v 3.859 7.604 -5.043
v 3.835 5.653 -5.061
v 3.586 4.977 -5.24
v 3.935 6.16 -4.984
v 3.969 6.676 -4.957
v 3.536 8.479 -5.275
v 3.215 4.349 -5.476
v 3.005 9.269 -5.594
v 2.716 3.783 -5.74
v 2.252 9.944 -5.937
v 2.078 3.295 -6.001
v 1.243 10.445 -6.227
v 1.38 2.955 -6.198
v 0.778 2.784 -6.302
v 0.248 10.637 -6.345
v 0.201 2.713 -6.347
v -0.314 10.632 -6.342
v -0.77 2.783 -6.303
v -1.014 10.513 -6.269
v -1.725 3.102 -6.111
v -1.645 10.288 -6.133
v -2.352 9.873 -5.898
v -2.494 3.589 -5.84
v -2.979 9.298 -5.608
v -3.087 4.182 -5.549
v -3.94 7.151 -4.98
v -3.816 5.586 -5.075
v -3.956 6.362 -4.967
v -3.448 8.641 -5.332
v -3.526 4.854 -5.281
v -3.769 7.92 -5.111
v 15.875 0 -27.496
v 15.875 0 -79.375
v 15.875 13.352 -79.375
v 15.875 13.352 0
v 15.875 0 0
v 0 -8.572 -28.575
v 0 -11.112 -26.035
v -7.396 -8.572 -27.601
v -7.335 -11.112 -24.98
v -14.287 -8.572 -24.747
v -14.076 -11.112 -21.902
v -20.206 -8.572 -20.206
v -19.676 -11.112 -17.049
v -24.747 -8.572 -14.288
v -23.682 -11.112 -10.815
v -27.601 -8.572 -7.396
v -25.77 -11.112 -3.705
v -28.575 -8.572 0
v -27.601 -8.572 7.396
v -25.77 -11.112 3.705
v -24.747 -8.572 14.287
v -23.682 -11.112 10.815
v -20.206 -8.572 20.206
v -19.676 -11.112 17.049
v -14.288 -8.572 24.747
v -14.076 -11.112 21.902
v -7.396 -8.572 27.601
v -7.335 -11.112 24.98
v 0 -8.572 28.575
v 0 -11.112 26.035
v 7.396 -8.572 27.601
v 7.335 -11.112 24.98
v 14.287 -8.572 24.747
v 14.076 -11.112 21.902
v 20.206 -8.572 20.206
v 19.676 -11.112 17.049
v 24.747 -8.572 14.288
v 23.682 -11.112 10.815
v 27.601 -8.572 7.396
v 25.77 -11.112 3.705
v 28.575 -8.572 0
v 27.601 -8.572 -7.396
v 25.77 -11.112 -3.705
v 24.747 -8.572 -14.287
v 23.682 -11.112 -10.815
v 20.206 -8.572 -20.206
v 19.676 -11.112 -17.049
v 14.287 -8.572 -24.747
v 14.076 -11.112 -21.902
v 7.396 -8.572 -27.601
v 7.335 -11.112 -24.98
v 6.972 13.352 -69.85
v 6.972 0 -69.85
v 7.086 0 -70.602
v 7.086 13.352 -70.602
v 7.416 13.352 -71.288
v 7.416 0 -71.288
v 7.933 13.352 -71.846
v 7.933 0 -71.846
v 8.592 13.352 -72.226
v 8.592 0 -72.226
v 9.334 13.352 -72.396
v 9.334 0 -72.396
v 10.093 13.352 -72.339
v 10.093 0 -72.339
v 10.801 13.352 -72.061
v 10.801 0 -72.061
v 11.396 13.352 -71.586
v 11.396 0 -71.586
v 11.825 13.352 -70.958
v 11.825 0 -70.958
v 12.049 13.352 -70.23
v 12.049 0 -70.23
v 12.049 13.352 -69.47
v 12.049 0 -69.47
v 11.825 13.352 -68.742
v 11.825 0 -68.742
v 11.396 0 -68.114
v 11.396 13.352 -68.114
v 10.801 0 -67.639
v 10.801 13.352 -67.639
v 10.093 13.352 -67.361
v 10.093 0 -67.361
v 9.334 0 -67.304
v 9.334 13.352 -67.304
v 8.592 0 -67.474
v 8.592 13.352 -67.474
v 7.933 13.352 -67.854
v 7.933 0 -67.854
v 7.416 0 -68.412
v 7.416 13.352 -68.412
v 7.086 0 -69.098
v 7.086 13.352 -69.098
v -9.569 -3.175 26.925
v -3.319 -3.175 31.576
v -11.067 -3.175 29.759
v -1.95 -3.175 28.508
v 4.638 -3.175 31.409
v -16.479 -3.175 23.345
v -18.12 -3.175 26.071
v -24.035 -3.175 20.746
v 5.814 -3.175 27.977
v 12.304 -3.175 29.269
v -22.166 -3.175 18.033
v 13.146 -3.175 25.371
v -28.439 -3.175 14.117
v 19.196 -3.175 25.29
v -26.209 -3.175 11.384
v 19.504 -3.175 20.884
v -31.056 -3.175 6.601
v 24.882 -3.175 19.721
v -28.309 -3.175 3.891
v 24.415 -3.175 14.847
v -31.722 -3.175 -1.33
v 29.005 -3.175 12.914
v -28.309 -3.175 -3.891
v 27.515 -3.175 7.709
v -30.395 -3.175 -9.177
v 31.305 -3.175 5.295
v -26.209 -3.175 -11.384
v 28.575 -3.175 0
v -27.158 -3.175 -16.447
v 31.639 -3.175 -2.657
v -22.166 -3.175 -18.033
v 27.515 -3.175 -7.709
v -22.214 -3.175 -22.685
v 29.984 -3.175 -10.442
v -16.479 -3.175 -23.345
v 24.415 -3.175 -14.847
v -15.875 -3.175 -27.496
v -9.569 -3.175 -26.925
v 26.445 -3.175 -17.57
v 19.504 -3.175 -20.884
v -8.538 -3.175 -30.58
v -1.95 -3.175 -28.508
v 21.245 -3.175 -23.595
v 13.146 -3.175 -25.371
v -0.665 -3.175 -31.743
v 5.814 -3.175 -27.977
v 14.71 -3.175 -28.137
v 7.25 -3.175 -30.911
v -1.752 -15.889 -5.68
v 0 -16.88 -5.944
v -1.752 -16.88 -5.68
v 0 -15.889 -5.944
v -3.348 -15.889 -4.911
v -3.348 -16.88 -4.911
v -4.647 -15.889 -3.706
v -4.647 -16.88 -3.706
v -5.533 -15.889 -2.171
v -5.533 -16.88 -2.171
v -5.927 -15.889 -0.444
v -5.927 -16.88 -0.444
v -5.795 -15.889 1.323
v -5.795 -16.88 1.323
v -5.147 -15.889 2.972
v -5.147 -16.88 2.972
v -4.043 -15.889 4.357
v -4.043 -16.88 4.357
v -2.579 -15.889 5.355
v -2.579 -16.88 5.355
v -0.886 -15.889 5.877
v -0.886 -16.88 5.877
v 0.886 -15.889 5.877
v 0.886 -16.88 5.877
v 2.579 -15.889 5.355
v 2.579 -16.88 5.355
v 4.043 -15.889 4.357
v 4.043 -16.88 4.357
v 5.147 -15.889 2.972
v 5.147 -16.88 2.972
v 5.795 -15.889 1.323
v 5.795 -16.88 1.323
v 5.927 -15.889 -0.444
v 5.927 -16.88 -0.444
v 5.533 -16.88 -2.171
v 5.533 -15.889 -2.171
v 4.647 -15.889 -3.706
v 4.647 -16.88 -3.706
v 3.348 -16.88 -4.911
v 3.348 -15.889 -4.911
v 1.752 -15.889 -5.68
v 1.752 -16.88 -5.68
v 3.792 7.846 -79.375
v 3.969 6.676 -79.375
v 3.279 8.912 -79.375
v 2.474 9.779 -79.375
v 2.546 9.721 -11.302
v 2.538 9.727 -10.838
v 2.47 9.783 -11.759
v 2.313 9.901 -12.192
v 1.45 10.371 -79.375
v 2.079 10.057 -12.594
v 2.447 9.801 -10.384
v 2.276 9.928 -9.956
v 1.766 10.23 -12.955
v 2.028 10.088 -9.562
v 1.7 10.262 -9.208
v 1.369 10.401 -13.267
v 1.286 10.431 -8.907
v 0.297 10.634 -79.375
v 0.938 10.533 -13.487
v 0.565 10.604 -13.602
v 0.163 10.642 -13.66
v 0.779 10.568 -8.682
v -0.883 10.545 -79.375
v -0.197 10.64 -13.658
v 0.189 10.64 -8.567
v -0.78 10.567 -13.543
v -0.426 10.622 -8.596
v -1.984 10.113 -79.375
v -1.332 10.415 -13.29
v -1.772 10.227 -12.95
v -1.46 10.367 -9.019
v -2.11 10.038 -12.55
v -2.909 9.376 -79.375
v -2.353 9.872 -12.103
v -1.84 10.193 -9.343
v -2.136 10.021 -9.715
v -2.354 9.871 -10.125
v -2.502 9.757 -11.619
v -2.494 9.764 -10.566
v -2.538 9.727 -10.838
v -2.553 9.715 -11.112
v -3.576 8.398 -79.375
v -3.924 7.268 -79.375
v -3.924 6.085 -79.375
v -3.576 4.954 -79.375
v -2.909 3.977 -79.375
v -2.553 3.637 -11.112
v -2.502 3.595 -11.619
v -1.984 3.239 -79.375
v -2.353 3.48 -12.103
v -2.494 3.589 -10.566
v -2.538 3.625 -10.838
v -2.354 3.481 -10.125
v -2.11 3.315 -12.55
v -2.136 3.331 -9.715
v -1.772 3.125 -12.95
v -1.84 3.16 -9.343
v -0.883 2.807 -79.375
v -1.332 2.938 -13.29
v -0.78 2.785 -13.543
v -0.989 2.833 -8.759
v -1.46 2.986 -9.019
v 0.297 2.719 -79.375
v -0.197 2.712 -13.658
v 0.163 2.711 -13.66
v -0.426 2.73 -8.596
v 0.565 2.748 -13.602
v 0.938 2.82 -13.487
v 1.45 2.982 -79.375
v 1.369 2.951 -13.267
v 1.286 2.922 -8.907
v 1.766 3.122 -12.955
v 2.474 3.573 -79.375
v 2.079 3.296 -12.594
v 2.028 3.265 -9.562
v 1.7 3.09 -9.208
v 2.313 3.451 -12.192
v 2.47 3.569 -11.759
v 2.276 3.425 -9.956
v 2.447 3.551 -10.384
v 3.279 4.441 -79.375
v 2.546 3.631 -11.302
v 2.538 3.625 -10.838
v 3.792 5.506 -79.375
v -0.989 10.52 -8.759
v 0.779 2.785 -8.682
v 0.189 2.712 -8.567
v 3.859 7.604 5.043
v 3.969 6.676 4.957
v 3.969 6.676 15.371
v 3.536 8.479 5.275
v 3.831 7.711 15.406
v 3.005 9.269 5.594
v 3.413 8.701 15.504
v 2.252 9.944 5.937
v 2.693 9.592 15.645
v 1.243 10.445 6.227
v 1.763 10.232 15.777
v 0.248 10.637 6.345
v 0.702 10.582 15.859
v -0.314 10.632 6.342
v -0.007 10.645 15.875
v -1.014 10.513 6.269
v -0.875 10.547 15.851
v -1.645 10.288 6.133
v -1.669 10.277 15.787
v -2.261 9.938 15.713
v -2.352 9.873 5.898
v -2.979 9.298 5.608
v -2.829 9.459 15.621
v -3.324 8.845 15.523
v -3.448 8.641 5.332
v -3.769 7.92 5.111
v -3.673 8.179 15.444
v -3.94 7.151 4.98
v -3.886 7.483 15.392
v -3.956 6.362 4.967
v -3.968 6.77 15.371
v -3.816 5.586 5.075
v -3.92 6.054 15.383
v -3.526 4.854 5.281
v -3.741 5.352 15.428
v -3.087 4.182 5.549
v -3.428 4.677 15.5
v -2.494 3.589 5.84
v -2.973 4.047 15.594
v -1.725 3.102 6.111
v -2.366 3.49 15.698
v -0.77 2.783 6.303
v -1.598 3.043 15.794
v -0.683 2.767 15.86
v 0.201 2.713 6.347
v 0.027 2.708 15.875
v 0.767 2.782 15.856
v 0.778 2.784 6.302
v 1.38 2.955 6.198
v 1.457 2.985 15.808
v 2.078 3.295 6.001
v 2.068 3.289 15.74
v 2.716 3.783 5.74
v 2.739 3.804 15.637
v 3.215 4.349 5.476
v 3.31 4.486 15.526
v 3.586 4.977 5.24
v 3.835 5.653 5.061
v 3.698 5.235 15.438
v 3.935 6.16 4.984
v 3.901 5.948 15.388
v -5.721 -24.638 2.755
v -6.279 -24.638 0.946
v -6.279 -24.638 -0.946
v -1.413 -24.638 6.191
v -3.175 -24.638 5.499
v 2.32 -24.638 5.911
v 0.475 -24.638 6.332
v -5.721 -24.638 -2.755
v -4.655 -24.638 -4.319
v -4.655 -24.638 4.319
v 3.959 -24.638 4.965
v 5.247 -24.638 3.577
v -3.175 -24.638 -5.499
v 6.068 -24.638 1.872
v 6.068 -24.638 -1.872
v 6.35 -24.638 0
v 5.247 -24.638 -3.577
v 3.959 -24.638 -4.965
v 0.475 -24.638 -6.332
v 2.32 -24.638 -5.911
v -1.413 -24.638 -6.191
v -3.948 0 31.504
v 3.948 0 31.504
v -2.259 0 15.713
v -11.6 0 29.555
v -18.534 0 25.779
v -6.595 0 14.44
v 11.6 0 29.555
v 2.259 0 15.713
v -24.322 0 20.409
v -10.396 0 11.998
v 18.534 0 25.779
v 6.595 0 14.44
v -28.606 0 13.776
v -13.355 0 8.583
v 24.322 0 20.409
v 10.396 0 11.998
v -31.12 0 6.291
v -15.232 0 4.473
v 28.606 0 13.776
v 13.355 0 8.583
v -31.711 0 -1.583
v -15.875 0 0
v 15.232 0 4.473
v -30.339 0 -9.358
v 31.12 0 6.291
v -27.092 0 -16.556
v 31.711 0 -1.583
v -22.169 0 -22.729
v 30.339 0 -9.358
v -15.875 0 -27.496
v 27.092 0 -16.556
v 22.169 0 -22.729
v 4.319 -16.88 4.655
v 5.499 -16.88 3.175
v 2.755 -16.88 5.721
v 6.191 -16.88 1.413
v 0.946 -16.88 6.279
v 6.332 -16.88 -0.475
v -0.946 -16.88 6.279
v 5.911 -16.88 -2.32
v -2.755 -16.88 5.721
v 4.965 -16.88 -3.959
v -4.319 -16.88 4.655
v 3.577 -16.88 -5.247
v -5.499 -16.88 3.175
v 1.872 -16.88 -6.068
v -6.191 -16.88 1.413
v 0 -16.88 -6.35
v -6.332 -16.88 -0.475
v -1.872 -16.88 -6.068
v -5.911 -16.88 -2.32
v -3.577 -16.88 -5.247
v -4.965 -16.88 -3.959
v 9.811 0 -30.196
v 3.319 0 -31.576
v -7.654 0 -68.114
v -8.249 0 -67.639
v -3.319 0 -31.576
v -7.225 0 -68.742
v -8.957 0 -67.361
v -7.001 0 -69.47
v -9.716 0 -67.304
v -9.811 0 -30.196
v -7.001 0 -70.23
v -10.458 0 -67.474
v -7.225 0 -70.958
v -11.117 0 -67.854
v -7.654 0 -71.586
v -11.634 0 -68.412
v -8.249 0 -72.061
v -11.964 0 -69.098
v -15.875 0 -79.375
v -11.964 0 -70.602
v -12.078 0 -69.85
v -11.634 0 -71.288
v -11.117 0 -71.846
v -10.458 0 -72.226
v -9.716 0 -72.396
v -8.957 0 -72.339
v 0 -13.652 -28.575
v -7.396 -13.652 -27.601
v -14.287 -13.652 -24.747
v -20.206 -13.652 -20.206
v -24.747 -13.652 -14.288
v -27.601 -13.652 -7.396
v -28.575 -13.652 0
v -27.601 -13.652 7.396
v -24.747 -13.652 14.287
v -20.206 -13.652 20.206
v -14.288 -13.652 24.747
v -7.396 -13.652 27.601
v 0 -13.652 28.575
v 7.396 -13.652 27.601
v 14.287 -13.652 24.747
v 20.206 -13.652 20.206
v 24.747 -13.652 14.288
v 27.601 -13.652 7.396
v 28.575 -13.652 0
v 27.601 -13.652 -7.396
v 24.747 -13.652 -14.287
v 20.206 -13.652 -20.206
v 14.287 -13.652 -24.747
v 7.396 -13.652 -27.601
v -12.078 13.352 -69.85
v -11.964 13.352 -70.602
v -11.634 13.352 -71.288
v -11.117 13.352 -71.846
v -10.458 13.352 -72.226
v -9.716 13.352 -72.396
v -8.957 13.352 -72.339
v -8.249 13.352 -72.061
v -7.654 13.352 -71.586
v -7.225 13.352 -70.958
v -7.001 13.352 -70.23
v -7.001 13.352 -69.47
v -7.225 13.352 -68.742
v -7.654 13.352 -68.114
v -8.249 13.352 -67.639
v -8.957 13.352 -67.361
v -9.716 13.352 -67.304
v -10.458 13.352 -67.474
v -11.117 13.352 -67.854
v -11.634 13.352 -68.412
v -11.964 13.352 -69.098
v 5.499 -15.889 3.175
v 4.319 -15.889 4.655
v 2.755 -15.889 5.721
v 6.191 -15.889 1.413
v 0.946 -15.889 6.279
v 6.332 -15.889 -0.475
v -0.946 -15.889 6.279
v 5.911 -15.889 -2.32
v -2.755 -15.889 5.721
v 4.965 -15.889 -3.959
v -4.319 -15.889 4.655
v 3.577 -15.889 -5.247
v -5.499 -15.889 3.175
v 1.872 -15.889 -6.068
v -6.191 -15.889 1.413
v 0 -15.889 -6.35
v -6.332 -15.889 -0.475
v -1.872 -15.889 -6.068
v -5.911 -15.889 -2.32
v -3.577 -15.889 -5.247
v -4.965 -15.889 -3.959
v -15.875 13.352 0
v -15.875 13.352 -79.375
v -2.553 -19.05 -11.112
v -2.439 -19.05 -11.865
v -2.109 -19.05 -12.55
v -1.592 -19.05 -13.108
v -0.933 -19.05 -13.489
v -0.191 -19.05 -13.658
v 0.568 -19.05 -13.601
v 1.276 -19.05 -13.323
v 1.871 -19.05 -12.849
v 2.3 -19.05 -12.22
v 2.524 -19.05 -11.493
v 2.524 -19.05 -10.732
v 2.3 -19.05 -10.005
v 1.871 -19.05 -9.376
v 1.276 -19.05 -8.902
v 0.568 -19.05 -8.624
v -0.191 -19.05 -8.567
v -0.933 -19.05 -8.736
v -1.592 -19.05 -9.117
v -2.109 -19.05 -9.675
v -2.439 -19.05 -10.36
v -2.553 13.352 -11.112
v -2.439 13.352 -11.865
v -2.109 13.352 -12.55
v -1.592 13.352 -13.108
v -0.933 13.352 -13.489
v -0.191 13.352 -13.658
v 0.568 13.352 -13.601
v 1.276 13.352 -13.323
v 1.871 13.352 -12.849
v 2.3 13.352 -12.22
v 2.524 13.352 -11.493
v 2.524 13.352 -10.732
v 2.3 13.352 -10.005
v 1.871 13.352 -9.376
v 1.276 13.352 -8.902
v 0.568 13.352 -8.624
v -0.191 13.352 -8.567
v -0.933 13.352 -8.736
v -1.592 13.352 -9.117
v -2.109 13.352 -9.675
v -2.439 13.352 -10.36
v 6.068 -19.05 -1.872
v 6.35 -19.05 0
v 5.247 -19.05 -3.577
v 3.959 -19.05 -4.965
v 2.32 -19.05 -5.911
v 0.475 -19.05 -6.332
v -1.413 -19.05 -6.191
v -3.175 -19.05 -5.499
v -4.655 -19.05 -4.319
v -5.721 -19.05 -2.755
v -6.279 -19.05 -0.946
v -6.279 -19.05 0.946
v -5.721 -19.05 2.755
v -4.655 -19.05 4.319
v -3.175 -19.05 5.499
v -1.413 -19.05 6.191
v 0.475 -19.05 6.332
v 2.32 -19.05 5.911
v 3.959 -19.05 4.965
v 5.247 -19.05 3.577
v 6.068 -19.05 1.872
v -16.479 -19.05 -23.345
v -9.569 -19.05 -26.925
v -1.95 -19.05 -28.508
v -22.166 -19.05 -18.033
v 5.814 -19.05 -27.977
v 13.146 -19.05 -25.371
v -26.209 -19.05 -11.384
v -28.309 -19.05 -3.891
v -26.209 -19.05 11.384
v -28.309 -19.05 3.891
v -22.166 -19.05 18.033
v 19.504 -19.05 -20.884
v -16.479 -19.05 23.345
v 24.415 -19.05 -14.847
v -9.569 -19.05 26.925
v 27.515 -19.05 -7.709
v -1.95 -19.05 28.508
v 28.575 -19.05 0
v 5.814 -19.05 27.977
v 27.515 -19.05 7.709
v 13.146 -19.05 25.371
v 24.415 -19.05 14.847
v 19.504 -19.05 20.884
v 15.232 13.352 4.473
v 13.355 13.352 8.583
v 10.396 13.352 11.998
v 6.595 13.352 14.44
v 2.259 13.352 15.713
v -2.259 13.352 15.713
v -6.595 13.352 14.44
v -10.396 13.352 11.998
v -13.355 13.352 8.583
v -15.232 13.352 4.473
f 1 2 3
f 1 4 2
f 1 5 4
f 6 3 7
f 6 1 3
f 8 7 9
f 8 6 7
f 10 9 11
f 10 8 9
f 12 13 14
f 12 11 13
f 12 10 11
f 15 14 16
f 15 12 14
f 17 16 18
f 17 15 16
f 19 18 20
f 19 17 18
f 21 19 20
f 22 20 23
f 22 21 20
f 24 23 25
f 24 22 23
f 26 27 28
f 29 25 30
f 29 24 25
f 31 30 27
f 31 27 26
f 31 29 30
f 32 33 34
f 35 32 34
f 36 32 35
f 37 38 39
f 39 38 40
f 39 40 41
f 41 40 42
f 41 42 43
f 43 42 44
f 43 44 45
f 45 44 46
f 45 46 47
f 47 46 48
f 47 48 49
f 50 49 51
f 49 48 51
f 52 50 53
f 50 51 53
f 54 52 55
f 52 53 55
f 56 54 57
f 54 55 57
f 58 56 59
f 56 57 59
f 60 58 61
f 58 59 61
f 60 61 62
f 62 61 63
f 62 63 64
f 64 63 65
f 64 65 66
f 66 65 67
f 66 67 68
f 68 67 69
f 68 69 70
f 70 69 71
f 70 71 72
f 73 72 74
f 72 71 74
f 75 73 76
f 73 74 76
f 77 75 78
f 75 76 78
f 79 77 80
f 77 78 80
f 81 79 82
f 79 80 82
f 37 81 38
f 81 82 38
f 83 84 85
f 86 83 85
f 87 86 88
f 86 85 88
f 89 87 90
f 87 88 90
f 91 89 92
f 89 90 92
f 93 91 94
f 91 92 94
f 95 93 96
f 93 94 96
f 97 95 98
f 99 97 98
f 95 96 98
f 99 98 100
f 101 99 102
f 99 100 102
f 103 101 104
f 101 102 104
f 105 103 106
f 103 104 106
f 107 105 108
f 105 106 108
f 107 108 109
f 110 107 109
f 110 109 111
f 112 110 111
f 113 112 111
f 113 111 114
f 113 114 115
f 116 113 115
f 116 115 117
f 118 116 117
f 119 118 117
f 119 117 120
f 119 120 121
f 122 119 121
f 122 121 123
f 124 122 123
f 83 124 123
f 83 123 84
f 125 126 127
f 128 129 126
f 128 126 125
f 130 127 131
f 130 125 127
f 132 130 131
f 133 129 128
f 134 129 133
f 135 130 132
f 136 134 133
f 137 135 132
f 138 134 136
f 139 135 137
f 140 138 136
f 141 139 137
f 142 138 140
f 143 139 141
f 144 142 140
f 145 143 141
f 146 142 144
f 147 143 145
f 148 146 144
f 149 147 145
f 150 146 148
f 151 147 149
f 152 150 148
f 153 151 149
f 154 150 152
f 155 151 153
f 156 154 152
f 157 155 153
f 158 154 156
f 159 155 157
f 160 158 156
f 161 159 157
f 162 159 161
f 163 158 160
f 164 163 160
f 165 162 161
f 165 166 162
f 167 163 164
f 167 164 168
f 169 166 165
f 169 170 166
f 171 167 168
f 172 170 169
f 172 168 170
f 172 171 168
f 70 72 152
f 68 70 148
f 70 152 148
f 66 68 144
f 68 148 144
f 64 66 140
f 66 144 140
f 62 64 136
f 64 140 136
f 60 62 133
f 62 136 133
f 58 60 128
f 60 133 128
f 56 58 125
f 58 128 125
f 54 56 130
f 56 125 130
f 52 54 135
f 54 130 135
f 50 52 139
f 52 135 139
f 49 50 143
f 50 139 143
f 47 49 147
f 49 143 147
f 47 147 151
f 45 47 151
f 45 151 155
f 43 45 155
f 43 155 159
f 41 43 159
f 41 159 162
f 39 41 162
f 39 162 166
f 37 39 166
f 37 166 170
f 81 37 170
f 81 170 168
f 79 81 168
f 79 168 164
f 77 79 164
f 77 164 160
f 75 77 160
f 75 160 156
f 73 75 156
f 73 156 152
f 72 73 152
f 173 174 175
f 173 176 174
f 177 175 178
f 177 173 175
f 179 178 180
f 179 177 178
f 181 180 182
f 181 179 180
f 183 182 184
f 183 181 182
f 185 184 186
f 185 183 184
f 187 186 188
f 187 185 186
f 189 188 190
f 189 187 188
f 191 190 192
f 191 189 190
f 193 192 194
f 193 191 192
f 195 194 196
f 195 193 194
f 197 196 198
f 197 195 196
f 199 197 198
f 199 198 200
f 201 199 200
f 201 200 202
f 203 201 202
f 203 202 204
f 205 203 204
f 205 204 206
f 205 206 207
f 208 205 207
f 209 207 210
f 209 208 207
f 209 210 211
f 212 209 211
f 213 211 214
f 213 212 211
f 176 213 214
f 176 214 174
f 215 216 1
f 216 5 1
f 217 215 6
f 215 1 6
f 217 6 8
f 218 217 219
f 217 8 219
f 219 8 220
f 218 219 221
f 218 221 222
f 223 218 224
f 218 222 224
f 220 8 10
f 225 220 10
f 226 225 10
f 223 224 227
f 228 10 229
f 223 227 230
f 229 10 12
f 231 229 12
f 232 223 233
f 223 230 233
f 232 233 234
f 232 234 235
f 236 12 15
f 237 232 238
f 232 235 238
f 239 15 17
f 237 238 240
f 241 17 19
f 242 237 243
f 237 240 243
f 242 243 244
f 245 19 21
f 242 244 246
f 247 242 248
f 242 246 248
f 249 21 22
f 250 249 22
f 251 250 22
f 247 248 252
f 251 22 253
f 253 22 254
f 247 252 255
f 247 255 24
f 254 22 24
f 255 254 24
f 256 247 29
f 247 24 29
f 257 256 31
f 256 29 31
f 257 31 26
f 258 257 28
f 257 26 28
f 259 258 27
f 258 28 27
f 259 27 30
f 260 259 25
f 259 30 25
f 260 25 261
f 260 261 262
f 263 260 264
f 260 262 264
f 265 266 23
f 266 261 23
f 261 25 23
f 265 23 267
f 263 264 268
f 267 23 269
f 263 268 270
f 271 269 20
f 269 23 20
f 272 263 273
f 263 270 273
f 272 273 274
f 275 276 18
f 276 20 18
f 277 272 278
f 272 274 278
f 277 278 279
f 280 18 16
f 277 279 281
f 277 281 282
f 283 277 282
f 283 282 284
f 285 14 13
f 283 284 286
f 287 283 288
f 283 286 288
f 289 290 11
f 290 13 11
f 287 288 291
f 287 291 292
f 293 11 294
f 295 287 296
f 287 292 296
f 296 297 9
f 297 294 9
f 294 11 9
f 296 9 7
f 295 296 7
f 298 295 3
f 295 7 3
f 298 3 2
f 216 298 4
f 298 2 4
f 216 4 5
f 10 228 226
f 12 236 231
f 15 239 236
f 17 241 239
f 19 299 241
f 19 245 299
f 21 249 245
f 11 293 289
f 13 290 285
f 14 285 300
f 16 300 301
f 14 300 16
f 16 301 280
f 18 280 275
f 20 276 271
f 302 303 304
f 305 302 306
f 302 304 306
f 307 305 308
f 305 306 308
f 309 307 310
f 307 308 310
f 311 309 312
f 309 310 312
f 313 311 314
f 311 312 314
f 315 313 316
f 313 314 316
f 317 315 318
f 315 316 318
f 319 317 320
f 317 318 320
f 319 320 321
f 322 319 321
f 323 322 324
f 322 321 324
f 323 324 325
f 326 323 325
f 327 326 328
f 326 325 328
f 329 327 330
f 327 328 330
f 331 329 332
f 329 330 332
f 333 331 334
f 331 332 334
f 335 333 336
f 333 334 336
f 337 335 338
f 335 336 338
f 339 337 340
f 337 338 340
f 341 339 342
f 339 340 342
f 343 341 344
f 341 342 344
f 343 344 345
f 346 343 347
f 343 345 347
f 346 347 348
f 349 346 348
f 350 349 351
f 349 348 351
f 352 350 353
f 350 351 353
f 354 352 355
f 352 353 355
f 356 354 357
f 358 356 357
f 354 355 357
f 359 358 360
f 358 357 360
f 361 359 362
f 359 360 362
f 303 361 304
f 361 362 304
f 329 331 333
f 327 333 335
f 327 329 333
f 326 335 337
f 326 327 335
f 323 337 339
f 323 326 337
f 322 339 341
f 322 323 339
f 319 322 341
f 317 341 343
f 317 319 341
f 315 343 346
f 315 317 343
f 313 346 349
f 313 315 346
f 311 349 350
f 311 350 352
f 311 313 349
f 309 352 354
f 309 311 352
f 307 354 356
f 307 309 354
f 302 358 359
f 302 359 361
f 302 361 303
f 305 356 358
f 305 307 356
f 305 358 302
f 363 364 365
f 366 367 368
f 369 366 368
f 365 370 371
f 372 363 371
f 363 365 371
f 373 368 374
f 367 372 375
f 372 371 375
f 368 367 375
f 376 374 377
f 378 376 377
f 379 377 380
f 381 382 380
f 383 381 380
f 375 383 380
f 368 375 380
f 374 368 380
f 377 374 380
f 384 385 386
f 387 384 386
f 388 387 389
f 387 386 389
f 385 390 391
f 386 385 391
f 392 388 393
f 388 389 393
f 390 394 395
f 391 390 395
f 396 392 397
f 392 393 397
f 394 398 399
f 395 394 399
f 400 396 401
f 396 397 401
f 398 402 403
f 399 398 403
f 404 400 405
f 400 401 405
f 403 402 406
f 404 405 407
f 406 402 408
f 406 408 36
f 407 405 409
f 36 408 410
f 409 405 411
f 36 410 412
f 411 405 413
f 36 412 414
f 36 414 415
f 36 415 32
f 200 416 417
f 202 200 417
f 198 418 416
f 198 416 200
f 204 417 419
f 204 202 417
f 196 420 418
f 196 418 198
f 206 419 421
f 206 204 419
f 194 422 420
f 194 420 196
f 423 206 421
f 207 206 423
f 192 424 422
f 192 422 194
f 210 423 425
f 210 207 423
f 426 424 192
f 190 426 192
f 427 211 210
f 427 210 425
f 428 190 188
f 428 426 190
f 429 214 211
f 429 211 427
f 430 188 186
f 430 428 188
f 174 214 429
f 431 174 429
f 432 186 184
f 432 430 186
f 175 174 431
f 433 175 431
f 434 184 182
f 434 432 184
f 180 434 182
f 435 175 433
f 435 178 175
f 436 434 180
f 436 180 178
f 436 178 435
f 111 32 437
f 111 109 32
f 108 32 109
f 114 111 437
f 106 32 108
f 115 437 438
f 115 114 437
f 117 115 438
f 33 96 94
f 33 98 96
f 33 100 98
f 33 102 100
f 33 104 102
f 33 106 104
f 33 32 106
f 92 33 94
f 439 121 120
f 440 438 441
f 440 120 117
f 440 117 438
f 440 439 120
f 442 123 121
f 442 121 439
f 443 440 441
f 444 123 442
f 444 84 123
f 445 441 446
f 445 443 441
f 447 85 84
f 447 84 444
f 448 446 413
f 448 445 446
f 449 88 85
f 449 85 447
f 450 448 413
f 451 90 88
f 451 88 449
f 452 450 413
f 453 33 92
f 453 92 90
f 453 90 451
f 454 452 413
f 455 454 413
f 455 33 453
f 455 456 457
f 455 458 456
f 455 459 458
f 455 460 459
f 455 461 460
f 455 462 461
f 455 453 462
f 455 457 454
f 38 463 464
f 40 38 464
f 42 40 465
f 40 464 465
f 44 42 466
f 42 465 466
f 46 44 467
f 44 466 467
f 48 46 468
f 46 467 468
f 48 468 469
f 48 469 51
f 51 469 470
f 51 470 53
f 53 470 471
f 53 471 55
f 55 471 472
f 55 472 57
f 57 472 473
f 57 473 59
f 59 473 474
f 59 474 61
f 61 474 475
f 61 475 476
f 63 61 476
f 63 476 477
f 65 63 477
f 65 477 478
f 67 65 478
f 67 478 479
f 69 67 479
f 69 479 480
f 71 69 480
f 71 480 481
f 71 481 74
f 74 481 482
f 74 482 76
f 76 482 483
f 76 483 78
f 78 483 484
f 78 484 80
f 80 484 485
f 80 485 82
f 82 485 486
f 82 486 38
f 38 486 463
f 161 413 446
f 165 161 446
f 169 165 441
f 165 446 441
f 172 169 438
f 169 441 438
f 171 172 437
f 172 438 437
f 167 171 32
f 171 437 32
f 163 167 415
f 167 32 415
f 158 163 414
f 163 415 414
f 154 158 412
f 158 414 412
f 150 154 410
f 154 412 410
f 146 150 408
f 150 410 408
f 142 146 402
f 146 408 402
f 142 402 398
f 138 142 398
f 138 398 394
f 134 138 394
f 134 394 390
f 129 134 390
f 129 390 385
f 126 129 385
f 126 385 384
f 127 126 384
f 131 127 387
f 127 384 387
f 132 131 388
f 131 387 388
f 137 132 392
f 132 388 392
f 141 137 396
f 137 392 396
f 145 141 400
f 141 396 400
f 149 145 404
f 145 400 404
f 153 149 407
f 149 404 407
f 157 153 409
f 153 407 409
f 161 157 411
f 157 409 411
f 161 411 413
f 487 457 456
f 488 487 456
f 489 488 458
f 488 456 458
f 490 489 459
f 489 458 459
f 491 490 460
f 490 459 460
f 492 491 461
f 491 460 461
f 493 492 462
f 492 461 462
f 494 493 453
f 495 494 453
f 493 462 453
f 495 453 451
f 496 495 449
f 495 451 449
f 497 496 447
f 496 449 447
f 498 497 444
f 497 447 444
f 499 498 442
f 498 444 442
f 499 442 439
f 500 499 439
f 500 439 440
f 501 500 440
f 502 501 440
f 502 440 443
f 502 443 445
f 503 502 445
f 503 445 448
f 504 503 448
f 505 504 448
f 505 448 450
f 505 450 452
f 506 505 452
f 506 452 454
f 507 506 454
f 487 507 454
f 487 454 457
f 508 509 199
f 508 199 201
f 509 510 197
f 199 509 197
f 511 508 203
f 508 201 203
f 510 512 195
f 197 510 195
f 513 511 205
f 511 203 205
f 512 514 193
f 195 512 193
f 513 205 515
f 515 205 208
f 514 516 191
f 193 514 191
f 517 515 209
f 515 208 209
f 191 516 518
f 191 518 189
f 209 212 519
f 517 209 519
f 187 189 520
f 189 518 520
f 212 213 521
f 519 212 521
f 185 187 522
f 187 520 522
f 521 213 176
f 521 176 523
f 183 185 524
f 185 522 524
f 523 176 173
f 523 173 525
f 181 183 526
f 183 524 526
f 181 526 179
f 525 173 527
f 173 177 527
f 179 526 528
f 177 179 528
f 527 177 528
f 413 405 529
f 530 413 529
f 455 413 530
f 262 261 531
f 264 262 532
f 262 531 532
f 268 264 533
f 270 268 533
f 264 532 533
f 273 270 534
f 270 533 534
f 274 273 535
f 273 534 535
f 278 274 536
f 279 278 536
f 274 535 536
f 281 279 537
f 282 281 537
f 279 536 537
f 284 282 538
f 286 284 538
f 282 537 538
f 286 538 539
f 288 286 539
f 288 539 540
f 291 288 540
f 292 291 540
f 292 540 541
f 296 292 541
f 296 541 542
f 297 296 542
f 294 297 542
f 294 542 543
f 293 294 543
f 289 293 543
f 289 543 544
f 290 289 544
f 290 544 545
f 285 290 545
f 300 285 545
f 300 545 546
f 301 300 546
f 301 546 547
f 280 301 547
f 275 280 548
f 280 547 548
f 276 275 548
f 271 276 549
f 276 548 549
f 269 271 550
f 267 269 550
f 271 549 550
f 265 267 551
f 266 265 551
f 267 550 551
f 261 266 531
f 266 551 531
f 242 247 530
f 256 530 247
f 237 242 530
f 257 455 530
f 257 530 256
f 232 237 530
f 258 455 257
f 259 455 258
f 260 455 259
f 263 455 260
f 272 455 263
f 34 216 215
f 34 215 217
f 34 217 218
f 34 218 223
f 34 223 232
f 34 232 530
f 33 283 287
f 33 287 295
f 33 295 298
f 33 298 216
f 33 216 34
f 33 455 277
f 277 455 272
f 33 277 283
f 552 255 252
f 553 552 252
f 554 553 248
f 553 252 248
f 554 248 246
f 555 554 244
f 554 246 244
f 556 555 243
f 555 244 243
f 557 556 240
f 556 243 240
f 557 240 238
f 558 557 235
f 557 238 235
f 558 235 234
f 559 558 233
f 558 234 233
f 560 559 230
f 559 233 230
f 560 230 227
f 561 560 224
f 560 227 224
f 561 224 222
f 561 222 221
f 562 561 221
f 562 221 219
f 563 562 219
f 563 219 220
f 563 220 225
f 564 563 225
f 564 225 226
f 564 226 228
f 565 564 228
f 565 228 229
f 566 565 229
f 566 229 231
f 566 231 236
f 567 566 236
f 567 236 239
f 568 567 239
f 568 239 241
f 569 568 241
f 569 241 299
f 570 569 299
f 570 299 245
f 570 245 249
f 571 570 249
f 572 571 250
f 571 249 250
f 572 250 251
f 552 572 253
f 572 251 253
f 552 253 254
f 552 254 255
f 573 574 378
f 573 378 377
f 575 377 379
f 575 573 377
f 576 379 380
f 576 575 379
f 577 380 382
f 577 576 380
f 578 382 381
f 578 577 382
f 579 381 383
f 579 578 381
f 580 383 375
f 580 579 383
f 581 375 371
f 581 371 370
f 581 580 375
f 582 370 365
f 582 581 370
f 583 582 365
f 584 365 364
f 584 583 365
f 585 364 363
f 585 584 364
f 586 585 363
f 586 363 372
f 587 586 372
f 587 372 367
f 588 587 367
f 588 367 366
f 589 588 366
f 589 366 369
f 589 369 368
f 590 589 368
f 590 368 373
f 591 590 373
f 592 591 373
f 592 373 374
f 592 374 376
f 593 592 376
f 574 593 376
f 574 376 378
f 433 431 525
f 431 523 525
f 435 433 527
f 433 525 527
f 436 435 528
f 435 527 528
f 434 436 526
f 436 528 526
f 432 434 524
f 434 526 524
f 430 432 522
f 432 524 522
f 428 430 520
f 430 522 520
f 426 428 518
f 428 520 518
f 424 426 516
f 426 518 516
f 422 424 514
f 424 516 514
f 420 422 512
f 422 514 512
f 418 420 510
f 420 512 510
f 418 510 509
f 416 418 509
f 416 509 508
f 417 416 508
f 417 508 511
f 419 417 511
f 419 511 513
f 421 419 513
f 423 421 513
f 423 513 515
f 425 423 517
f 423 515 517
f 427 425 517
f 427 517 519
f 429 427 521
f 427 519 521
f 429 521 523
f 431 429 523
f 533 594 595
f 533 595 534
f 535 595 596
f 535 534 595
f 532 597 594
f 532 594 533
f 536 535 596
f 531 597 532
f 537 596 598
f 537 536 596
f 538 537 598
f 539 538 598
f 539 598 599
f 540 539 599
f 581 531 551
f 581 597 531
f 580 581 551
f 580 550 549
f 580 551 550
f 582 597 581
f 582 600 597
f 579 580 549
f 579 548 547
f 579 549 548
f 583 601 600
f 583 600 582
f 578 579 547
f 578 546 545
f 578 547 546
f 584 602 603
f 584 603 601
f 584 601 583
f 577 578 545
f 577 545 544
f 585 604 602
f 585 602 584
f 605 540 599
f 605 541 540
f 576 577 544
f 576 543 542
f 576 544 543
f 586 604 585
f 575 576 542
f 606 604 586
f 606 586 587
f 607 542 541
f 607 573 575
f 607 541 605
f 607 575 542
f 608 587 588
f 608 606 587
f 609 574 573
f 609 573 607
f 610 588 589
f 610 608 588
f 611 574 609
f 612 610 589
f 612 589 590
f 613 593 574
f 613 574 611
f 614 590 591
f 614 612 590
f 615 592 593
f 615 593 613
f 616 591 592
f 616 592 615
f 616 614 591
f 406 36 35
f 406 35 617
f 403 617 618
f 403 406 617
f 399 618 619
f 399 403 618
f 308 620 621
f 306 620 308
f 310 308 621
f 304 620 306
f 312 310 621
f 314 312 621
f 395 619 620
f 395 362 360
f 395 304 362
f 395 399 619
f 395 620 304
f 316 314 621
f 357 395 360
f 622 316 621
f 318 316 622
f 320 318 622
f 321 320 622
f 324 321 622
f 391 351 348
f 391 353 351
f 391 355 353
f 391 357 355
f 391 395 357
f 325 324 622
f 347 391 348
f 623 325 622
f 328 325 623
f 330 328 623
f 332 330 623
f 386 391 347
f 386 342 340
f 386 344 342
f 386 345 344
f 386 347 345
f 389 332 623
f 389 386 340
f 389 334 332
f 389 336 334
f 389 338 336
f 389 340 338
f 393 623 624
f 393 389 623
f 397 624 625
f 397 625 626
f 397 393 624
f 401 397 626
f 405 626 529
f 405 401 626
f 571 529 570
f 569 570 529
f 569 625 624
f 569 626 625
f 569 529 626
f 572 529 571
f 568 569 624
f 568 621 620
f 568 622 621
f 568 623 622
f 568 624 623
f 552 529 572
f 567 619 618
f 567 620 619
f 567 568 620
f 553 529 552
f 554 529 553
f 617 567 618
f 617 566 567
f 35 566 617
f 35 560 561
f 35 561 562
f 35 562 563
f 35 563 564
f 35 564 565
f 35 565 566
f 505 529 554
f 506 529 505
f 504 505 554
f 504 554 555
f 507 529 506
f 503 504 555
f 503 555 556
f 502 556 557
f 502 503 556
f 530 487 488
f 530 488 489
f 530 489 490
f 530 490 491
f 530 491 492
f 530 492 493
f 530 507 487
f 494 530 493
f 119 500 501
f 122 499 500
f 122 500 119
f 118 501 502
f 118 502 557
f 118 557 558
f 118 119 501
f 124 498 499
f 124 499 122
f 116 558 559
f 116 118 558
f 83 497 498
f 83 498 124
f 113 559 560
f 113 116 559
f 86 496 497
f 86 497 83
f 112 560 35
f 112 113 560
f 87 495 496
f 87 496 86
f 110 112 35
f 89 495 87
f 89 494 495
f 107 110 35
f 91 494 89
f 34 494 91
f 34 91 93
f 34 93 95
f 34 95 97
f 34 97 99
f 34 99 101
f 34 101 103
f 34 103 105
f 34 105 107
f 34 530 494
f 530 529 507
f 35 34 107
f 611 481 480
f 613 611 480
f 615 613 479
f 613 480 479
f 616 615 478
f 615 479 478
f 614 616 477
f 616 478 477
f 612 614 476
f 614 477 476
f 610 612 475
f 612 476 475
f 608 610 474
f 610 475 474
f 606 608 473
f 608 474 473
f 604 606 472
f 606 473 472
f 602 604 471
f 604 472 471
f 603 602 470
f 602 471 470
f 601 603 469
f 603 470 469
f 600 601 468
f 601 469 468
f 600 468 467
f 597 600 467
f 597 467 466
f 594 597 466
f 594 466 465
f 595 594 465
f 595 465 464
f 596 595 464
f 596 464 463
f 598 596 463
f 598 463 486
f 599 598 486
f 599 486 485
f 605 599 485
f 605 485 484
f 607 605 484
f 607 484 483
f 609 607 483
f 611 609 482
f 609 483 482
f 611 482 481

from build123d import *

# Parameters (mm, degrees)
BOSS_EXTRUDE1_DEPTH         = 13.352390271
SKETCH4_R                   = 28.575
BOSS_EXTRUDE2_DEPTH         = 19.05
SKETCH5_R                   = 31.75
SKETCH5_R_2                 = 28.575
BOSS_EXTRUDE3_DEPTH         = 3.175
F_3_8_16_TAPPED_HOLE1_D     = 7.9375
F_1_4_20_TAPPED_HOLE2_D     = 5.1054
F_1_4_20_TAPPED_HOLE2_DEPTH = 118.27002
F_1_4_20_TAPPED_HOLE2_TIP   = 1.533816902
SKETCH2_R                   = 6.35
BOSS_EXTRUDE6_DEPTH         = 37.990390271
SKETCH23_W                  = 0.4064
SKETCH23_H                  = 0.9906


with BuildPart() as part:
    # Sketch1 → Boss-Extrude1 (new body)
    with BuildSketch(Plane(origin=(0, 0, 0), x_dir=(1, 0, 0), z_dir=(0, 1, 0))):
        with BuildLine():
            Line((-15.875, 0), (-15.875, 79.375))
            Line((-15.875, 79.375), (15.875, 79.375))
            Line((15.875, 79.375), (15.875, 0))
            ThreePointArc((15.875, 0), (0, -15.875), (-15.875, 0))
        make_face()
    extrude(amount=BOSS_EXTRUDE1_DEPTH)

    # Sketch4 → Boss-Extrude2 (add)
    with BuildSketch(Plane.XZ):
        Circle(SKETCH4_R)
    extrude(amount=BOSS_EXTRUDE2_DEPTH)

    # Sketch5 → Boss-Extrude3 (add)
    with BuildSketch(Plane.XZ):
        with Locations(Location((0, 0, 0), (0, 0, 240))):
            Circle(SKETCH5_R)
        Circle(SKETCH5_R_2, mode=Mode.SUBTRACT)
    extrude(amount=BOSS_EXTRUDE3_DEPTH)

    # 3/8-16 Tapped Hole1 (through all)
    with Locations(Plane(origin=(0, 0, -79.375), x_dir=(-1, 0, 0), z_dir=(0, 0, -1))):
        with Locations((0, 6.676195135)):
            Hole(F_3_8_16_TAPPED_HOLE1_D / 2)

    # 1/4-20 Tapped Hole2
    with Locations(Plane(origin=(0, 13.352390271, 0), x_dir=(1, 0, 0), z_dir=(0, 1, 0))):
        with Locations((-9.525, 69.85), (9.525, 69.85), (0, 11.1125)):
            Hole(F_1_4_20_TAPPED_HOLE2_D / 2, depth=F_1_4_20_TAPPED_HOLE2_DEPTH)
            with Locations((0, 0, -(F_1_4_20_TAPPED_HOLE2_DEPTH + F_1_4_20_TAPPED_HOLE2_TIP / 2))):  # 118° drill point
                Cone(0, F_1_4_20_TAPPED_HOLE2_D / 2, F_1_4_20_TAPPED_HOLE2_TIP, mode=Mode.SUBTRACT)

    # Sketch22 → Cut-Revolve2 (revolve, cut)
    with BuildSketch(Plane.XY, mode=Mode.PRIVATE) as cut_revolve2_sk:
        Polygon((28.575, -8.5725), (26.035, -11.1125), (28.575, -13.6525), align=None)
    revolve(cut_revolve2_sk.sketch.rotate(Axis((0, -19.050000001, 0), (0, 1, 0)), 90), axis=Axis((0, -19.050000001, 0), (0, 1, 0)), mode=Mode.SUBTRACT)

    # Sketch2 → Boss-Extrude6 (add)
    with BuildSketch(Plane(origin=(0, 13.352390271, 0), x_dir=(1, 0, 0), z_dir=(0, 1, 0))):
        Circle(SKETCH2_R)
    extrude(amount=-BOSS_EXTRUDE6_DEPTH)

    # Sketch23 → Cut-Revolve4 (revolve, cut)
    with BuildSketch(Plane(origin=(0, 0, 0), x_dir=(0, 0, -1), z_dir=(1, 0, 0)), mode=Mode.PRIVATE) as cut_revolve4_sk:
        with Locations((-6.1468, -16.384583292)):
            Rectangle(SKETCH23_W, SKETCH23_H)
    revolve(cut_revolve4_sk.sketch.rotate(Axis((0, -24.638, 0), (0, 1, 0)), 180), axis=Axis((0, -24.638, 0), (0, 1, 0)), mode=Mode.SUBTRACT)


solid = part.part
